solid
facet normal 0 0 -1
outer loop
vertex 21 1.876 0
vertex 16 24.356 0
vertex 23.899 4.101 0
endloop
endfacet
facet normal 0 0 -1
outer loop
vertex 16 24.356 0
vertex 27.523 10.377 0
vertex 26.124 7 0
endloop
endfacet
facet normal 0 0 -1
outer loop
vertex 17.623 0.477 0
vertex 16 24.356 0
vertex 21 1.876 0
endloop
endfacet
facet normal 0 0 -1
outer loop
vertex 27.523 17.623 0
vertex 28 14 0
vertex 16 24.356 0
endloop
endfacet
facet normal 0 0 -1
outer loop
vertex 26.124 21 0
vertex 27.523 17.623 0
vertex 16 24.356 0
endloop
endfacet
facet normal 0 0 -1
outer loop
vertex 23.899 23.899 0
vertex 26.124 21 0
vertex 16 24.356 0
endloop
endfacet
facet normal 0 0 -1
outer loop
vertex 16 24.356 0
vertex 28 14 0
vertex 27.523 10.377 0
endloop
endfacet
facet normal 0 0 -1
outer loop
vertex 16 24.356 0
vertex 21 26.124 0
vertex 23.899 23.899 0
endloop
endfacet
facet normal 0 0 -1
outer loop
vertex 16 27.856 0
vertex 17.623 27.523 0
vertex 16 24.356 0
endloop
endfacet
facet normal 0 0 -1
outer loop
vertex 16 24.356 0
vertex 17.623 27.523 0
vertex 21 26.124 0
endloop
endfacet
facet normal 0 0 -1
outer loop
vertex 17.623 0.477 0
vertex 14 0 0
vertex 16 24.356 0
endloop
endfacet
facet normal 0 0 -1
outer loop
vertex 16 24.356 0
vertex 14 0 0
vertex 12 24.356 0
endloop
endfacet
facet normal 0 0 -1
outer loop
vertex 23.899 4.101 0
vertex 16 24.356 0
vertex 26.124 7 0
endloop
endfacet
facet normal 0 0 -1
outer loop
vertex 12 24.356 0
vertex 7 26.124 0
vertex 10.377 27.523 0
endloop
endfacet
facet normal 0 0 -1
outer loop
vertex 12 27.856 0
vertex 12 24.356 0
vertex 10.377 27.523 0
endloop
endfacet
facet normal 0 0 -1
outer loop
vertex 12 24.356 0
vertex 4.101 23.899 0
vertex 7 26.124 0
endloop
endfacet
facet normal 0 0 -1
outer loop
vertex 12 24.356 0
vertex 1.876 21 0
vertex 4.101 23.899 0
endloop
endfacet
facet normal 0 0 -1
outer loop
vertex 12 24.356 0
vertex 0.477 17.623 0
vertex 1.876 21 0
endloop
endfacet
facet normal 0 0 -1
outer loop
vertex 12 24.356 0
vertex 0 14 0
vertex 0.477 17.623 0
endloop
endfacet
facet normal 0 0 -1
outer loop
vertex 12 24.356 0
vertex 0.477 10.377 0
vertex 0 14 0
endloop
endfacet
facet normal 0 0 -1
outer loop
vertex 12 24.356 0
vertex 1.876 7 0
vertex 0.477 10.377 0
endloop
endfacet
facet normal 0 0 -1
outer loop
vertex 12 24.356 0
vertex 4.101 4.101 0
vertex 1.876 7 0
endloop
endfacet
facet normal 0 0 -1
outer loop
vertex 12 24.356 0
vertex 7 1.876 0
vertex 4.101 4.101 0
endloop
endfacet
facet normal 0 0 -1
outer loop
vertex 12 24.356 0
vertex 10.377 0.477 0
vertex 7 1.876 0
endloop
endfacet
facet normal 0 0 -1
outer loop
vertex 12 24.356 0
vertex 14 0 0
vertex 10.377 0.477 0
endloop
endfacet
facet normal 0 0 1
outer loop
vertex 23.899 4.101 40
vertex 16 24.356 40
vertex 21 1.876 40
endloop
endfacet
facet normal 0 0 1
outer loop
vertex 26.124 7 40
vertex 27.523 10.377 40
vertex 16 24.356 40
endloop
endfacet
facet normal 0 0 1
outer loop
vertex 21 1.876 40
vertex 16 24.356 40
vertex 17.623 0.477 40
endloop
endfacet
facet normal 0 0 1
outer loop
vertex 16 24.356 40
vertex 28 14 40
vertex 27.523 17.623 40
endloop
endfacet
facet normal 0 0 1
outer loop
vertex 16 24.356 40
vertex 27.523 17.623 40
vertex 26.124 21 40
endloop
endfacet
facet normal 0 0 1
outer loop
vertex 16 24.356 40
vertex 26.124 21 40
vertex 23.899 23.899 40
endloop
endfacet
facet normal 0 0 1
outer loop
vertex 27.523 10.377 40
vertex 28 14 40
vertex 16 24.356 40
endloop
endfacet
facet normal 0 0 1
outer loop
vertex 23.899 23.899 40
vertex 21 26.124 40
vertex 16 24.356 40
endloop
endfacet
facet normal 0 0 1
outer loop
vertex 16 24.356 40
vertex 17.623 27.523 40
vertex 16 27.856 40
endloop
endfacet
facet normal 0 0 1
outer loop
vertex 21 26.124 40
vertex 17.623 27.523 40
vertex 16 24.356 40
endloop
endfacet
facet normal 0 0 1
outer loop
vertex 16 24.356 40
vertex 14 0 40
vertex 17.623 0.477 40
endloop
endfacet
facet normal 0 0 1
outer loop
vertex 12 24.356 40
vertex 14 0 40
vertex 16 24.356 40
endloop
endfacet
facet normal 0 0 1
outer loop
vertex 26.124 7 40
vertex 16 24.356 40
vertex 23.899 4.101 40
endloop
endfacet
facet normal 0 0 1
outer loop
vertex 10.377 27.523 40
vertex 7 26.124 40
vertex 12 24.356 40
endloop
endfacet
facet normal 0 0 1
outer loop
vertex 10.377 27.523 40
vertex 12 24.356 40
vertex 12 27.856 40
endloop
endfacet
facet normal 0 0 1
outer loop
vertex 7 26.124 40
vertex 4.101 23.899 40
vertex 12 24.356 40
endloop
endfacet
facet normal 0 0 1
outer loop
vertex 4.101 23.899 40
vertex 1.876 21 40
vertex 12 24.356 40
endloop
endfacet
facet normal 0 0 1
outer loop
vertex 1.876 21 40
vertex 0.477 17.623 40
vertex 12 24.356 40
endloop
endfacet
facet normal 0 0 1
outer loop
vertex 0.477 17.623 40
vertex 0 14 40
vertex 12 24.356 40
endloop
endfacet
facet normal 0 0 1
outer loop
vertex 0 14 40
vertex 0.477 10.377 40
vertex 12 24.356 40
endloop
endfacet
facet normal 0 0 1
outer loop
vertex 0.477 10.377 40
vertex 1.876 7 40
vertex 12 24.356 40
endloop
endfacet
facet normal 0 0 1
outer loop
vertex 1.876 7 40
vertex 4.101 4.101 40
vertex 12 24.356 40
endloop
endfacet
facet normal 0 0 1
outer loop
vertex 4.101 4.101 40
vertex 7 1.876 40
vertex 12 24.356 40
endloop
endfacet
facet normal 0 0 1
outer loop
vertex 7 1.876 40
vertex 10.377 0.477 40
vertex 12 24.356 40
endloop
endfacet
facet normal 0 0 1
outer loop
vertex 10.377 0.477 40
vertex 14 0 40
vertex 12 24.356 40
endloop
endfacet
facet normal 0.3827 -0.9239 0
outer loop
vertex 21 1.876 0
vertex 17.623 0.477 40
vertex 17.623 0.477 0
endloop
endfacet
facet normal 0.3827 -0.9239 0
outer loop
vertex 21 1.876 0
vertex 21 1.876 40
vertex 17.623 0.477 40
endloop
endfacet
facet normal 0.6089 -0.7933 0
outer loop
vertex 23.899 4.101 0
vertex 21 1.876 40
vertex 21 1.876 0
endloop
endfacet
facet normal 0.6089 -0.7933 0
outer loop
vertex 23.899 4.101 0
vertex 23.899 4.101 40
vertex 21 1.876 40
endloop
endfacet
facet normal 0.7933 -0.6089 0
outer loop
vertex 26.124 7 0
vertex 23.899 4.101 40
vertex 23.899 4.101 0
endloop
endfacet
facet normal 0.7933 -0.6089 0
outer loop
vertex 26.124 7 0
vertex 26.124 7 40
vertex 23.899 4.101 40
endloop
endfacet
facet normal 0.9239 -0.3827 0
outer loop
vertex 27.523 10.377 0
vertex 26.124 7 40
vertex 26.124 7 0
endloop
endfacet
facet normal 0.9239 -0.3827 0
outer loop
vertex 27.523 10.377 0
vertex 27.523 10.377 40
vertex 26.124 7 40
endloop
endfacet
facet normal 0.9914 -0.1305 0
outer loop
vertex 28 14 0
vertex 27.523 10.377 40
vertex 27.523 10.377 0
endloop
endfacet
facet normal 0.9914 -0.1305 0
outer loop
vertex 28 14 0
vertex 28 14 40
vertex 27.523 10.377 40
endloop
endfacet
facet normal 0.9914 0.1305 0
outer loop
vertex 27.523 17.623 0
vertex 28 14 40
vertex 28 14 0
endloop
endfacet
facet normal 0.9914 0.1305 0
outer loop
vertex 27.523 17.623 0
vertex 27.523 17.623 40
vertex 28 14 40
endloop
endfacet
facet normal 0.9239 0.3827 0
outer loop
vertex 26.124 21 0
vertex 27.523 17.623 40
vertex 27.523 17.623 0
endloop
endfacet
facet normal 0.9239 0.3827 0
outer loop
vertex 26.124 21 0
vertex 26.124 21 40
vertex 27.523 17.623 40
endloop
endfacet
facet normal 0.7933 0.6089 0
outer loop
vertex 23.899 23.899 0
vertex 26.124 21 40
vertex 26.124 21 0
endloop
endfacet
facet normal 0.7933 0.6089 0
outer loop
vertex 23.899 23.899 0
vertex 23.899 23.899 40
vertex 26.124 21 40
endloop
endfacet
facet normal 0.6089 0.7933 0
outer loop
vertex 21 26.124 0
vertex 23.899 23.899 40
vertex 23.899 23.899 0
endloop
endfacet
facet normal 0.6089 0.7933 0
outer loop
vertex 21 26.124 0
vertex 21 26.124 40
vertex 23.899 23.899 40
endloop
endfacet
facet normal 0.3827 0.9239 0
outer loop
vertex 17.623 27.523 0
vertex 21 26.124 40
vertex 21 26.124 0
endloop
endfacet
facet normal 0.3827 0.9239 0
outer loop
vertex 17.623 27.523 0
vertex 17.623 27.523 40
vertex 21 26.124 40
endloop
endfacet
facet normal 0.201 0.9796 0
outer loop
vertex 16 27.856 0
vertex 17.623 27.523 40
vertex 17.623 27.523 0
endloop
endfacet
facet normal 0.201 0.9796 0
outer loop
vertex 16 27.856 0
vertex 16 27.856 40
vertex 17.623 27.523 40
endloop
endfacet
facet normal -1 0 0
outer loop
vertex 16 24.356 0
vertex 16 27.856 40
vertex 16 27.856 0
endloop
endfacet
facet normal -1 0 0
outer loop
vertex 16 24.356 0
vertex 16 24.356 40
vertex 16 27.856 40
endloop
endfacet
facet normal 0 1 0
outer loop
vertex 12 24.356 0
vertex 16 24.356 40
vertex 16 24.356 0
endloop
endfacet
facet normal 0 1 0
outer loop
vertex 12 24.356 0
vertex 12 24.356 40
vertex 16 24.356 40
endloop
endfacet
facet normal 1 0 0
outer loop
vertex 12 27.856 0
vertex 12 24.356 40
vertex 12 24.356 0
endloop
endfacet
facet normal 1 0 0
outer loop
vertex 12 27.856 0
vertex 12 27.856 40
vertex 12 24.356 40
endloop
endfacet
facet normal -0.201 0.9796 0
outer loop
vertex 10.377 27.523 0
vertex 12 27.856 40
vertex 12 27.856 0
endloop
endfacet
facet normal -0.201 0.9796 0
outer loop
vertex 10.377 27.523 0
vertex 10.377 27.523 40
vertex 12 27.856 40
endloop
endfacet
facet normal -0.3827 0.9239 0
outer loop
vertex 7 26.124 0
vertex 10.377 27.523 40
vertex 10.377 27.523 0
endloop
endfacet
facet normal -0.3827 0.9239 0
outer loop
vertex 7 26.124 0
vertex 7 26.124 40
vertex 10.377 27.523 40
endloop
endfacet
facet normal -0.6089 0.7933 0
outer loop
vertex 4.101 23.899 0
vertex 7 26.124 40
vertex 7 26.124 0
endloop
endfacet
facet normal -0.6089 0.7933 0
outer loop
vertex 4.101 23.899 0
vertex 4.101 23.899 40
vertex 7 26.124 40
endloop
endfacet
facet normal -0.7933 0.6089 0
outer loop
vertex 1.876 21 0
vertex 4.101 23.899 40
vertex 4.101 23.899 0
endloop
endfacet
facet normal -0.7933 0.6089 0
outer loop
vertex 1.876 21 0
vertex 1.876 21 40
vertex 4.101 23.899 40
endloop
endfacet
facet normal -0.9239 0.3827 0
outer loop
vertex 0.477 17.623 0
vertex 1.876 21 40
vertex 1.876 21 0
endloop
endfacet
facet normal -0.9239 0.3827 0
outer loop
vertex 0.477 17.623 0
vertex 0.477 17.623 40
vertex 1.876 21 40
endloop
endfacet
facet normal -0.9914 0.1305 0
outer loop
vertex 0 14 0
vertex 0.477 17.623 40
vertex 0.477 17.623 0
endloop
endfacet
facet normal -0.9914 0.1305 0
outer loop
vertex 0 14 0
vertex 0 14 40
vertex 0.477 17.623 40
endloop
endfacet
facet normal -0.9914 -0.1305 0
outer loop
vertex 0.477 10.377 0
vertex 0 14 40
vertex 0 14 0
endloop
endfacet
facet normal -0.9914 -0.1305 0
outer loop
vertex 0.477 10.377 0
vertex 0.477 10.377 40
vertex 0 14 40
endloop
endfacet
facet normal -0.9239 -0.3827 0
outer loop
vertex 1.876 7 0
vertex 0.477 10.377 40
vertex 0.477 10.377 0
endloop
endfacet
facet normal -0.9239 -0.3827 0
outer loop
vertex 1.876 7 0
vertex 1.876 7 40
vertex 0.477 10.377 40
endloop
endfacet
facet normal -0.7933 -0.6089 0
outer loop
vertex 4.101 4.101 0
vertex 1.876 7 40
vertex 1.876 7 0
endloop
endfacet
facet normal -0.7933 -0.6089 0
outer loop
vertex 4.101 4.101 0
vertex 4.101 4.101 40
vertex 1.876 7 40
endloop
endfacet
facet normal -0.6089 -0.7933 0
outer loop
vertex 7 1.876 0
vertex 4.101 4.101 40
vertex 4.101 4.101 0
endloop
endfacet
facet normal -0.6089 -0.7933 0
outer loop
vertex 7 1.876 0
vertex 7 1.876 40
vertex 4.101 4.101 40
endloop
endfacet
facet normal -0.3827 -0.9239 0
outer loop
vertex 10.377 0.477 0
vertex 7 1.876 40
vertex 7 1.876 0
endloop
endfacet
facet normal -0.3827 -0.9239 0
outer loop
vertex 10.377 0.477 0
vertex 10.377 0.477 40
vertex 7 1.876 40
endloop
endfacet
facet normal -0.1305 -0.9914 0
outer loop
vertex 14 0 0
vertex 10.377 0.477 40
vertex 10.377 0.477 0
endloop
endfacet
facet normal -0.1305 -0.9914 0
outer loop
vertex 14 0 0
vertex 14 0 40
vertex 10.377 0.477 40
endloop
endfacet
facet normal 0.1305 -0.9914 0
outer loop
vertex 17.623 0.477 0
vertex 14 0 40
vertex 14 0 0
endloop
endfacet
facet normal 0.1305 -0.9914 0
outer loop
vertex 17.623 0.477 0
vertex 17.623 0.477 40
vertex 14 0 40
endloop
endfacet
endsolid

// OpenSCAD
$fn = 32;

// ----------------------------------------------------------------------
// Keyway shaft: d28 shaft, key 4 x 3.5 mm
// ----------------------------------------------------------------------

// --- parameters (mm) ---
shaft_r = 14;             // shaft radius
key_w = 4;                // keyway width
key_d = 3.5;              // keyway depth below the surface line
plate_t = 40;             // shaft length, Z (extrusion height)

shaft_d = 2 * shaft_r;  // shaft diameter
circle_step = 15;  // polygon sampling step, degrees

profile = [[10.377, 27.523], [7, 26.124], [4.101, 23.899], [1.876, 21], [0.477, 17.623], [0, 14], [0.477, 10.377], [1.876, 7], [4.101, 4.101], [7, 1.876], [10.377, 0.477], [14, 0], [17.623, 0.477], [21, 1.876], [23.899, 4.101], [26.124, 7], [27.523, 10.377], [28, 14], [27.523, 17.623], [26.124, 21], [23.899, 23.899], [21, 26.124], [17.623, 27.523], [16, 27.856], [16, 24.356], [12, 24.356], [12, 27.856]];  // primary outline, 27 points, counter clockwise

// --- the one profile operation ---
linear_extrude(height = plate_t) polygon(points = profile);
